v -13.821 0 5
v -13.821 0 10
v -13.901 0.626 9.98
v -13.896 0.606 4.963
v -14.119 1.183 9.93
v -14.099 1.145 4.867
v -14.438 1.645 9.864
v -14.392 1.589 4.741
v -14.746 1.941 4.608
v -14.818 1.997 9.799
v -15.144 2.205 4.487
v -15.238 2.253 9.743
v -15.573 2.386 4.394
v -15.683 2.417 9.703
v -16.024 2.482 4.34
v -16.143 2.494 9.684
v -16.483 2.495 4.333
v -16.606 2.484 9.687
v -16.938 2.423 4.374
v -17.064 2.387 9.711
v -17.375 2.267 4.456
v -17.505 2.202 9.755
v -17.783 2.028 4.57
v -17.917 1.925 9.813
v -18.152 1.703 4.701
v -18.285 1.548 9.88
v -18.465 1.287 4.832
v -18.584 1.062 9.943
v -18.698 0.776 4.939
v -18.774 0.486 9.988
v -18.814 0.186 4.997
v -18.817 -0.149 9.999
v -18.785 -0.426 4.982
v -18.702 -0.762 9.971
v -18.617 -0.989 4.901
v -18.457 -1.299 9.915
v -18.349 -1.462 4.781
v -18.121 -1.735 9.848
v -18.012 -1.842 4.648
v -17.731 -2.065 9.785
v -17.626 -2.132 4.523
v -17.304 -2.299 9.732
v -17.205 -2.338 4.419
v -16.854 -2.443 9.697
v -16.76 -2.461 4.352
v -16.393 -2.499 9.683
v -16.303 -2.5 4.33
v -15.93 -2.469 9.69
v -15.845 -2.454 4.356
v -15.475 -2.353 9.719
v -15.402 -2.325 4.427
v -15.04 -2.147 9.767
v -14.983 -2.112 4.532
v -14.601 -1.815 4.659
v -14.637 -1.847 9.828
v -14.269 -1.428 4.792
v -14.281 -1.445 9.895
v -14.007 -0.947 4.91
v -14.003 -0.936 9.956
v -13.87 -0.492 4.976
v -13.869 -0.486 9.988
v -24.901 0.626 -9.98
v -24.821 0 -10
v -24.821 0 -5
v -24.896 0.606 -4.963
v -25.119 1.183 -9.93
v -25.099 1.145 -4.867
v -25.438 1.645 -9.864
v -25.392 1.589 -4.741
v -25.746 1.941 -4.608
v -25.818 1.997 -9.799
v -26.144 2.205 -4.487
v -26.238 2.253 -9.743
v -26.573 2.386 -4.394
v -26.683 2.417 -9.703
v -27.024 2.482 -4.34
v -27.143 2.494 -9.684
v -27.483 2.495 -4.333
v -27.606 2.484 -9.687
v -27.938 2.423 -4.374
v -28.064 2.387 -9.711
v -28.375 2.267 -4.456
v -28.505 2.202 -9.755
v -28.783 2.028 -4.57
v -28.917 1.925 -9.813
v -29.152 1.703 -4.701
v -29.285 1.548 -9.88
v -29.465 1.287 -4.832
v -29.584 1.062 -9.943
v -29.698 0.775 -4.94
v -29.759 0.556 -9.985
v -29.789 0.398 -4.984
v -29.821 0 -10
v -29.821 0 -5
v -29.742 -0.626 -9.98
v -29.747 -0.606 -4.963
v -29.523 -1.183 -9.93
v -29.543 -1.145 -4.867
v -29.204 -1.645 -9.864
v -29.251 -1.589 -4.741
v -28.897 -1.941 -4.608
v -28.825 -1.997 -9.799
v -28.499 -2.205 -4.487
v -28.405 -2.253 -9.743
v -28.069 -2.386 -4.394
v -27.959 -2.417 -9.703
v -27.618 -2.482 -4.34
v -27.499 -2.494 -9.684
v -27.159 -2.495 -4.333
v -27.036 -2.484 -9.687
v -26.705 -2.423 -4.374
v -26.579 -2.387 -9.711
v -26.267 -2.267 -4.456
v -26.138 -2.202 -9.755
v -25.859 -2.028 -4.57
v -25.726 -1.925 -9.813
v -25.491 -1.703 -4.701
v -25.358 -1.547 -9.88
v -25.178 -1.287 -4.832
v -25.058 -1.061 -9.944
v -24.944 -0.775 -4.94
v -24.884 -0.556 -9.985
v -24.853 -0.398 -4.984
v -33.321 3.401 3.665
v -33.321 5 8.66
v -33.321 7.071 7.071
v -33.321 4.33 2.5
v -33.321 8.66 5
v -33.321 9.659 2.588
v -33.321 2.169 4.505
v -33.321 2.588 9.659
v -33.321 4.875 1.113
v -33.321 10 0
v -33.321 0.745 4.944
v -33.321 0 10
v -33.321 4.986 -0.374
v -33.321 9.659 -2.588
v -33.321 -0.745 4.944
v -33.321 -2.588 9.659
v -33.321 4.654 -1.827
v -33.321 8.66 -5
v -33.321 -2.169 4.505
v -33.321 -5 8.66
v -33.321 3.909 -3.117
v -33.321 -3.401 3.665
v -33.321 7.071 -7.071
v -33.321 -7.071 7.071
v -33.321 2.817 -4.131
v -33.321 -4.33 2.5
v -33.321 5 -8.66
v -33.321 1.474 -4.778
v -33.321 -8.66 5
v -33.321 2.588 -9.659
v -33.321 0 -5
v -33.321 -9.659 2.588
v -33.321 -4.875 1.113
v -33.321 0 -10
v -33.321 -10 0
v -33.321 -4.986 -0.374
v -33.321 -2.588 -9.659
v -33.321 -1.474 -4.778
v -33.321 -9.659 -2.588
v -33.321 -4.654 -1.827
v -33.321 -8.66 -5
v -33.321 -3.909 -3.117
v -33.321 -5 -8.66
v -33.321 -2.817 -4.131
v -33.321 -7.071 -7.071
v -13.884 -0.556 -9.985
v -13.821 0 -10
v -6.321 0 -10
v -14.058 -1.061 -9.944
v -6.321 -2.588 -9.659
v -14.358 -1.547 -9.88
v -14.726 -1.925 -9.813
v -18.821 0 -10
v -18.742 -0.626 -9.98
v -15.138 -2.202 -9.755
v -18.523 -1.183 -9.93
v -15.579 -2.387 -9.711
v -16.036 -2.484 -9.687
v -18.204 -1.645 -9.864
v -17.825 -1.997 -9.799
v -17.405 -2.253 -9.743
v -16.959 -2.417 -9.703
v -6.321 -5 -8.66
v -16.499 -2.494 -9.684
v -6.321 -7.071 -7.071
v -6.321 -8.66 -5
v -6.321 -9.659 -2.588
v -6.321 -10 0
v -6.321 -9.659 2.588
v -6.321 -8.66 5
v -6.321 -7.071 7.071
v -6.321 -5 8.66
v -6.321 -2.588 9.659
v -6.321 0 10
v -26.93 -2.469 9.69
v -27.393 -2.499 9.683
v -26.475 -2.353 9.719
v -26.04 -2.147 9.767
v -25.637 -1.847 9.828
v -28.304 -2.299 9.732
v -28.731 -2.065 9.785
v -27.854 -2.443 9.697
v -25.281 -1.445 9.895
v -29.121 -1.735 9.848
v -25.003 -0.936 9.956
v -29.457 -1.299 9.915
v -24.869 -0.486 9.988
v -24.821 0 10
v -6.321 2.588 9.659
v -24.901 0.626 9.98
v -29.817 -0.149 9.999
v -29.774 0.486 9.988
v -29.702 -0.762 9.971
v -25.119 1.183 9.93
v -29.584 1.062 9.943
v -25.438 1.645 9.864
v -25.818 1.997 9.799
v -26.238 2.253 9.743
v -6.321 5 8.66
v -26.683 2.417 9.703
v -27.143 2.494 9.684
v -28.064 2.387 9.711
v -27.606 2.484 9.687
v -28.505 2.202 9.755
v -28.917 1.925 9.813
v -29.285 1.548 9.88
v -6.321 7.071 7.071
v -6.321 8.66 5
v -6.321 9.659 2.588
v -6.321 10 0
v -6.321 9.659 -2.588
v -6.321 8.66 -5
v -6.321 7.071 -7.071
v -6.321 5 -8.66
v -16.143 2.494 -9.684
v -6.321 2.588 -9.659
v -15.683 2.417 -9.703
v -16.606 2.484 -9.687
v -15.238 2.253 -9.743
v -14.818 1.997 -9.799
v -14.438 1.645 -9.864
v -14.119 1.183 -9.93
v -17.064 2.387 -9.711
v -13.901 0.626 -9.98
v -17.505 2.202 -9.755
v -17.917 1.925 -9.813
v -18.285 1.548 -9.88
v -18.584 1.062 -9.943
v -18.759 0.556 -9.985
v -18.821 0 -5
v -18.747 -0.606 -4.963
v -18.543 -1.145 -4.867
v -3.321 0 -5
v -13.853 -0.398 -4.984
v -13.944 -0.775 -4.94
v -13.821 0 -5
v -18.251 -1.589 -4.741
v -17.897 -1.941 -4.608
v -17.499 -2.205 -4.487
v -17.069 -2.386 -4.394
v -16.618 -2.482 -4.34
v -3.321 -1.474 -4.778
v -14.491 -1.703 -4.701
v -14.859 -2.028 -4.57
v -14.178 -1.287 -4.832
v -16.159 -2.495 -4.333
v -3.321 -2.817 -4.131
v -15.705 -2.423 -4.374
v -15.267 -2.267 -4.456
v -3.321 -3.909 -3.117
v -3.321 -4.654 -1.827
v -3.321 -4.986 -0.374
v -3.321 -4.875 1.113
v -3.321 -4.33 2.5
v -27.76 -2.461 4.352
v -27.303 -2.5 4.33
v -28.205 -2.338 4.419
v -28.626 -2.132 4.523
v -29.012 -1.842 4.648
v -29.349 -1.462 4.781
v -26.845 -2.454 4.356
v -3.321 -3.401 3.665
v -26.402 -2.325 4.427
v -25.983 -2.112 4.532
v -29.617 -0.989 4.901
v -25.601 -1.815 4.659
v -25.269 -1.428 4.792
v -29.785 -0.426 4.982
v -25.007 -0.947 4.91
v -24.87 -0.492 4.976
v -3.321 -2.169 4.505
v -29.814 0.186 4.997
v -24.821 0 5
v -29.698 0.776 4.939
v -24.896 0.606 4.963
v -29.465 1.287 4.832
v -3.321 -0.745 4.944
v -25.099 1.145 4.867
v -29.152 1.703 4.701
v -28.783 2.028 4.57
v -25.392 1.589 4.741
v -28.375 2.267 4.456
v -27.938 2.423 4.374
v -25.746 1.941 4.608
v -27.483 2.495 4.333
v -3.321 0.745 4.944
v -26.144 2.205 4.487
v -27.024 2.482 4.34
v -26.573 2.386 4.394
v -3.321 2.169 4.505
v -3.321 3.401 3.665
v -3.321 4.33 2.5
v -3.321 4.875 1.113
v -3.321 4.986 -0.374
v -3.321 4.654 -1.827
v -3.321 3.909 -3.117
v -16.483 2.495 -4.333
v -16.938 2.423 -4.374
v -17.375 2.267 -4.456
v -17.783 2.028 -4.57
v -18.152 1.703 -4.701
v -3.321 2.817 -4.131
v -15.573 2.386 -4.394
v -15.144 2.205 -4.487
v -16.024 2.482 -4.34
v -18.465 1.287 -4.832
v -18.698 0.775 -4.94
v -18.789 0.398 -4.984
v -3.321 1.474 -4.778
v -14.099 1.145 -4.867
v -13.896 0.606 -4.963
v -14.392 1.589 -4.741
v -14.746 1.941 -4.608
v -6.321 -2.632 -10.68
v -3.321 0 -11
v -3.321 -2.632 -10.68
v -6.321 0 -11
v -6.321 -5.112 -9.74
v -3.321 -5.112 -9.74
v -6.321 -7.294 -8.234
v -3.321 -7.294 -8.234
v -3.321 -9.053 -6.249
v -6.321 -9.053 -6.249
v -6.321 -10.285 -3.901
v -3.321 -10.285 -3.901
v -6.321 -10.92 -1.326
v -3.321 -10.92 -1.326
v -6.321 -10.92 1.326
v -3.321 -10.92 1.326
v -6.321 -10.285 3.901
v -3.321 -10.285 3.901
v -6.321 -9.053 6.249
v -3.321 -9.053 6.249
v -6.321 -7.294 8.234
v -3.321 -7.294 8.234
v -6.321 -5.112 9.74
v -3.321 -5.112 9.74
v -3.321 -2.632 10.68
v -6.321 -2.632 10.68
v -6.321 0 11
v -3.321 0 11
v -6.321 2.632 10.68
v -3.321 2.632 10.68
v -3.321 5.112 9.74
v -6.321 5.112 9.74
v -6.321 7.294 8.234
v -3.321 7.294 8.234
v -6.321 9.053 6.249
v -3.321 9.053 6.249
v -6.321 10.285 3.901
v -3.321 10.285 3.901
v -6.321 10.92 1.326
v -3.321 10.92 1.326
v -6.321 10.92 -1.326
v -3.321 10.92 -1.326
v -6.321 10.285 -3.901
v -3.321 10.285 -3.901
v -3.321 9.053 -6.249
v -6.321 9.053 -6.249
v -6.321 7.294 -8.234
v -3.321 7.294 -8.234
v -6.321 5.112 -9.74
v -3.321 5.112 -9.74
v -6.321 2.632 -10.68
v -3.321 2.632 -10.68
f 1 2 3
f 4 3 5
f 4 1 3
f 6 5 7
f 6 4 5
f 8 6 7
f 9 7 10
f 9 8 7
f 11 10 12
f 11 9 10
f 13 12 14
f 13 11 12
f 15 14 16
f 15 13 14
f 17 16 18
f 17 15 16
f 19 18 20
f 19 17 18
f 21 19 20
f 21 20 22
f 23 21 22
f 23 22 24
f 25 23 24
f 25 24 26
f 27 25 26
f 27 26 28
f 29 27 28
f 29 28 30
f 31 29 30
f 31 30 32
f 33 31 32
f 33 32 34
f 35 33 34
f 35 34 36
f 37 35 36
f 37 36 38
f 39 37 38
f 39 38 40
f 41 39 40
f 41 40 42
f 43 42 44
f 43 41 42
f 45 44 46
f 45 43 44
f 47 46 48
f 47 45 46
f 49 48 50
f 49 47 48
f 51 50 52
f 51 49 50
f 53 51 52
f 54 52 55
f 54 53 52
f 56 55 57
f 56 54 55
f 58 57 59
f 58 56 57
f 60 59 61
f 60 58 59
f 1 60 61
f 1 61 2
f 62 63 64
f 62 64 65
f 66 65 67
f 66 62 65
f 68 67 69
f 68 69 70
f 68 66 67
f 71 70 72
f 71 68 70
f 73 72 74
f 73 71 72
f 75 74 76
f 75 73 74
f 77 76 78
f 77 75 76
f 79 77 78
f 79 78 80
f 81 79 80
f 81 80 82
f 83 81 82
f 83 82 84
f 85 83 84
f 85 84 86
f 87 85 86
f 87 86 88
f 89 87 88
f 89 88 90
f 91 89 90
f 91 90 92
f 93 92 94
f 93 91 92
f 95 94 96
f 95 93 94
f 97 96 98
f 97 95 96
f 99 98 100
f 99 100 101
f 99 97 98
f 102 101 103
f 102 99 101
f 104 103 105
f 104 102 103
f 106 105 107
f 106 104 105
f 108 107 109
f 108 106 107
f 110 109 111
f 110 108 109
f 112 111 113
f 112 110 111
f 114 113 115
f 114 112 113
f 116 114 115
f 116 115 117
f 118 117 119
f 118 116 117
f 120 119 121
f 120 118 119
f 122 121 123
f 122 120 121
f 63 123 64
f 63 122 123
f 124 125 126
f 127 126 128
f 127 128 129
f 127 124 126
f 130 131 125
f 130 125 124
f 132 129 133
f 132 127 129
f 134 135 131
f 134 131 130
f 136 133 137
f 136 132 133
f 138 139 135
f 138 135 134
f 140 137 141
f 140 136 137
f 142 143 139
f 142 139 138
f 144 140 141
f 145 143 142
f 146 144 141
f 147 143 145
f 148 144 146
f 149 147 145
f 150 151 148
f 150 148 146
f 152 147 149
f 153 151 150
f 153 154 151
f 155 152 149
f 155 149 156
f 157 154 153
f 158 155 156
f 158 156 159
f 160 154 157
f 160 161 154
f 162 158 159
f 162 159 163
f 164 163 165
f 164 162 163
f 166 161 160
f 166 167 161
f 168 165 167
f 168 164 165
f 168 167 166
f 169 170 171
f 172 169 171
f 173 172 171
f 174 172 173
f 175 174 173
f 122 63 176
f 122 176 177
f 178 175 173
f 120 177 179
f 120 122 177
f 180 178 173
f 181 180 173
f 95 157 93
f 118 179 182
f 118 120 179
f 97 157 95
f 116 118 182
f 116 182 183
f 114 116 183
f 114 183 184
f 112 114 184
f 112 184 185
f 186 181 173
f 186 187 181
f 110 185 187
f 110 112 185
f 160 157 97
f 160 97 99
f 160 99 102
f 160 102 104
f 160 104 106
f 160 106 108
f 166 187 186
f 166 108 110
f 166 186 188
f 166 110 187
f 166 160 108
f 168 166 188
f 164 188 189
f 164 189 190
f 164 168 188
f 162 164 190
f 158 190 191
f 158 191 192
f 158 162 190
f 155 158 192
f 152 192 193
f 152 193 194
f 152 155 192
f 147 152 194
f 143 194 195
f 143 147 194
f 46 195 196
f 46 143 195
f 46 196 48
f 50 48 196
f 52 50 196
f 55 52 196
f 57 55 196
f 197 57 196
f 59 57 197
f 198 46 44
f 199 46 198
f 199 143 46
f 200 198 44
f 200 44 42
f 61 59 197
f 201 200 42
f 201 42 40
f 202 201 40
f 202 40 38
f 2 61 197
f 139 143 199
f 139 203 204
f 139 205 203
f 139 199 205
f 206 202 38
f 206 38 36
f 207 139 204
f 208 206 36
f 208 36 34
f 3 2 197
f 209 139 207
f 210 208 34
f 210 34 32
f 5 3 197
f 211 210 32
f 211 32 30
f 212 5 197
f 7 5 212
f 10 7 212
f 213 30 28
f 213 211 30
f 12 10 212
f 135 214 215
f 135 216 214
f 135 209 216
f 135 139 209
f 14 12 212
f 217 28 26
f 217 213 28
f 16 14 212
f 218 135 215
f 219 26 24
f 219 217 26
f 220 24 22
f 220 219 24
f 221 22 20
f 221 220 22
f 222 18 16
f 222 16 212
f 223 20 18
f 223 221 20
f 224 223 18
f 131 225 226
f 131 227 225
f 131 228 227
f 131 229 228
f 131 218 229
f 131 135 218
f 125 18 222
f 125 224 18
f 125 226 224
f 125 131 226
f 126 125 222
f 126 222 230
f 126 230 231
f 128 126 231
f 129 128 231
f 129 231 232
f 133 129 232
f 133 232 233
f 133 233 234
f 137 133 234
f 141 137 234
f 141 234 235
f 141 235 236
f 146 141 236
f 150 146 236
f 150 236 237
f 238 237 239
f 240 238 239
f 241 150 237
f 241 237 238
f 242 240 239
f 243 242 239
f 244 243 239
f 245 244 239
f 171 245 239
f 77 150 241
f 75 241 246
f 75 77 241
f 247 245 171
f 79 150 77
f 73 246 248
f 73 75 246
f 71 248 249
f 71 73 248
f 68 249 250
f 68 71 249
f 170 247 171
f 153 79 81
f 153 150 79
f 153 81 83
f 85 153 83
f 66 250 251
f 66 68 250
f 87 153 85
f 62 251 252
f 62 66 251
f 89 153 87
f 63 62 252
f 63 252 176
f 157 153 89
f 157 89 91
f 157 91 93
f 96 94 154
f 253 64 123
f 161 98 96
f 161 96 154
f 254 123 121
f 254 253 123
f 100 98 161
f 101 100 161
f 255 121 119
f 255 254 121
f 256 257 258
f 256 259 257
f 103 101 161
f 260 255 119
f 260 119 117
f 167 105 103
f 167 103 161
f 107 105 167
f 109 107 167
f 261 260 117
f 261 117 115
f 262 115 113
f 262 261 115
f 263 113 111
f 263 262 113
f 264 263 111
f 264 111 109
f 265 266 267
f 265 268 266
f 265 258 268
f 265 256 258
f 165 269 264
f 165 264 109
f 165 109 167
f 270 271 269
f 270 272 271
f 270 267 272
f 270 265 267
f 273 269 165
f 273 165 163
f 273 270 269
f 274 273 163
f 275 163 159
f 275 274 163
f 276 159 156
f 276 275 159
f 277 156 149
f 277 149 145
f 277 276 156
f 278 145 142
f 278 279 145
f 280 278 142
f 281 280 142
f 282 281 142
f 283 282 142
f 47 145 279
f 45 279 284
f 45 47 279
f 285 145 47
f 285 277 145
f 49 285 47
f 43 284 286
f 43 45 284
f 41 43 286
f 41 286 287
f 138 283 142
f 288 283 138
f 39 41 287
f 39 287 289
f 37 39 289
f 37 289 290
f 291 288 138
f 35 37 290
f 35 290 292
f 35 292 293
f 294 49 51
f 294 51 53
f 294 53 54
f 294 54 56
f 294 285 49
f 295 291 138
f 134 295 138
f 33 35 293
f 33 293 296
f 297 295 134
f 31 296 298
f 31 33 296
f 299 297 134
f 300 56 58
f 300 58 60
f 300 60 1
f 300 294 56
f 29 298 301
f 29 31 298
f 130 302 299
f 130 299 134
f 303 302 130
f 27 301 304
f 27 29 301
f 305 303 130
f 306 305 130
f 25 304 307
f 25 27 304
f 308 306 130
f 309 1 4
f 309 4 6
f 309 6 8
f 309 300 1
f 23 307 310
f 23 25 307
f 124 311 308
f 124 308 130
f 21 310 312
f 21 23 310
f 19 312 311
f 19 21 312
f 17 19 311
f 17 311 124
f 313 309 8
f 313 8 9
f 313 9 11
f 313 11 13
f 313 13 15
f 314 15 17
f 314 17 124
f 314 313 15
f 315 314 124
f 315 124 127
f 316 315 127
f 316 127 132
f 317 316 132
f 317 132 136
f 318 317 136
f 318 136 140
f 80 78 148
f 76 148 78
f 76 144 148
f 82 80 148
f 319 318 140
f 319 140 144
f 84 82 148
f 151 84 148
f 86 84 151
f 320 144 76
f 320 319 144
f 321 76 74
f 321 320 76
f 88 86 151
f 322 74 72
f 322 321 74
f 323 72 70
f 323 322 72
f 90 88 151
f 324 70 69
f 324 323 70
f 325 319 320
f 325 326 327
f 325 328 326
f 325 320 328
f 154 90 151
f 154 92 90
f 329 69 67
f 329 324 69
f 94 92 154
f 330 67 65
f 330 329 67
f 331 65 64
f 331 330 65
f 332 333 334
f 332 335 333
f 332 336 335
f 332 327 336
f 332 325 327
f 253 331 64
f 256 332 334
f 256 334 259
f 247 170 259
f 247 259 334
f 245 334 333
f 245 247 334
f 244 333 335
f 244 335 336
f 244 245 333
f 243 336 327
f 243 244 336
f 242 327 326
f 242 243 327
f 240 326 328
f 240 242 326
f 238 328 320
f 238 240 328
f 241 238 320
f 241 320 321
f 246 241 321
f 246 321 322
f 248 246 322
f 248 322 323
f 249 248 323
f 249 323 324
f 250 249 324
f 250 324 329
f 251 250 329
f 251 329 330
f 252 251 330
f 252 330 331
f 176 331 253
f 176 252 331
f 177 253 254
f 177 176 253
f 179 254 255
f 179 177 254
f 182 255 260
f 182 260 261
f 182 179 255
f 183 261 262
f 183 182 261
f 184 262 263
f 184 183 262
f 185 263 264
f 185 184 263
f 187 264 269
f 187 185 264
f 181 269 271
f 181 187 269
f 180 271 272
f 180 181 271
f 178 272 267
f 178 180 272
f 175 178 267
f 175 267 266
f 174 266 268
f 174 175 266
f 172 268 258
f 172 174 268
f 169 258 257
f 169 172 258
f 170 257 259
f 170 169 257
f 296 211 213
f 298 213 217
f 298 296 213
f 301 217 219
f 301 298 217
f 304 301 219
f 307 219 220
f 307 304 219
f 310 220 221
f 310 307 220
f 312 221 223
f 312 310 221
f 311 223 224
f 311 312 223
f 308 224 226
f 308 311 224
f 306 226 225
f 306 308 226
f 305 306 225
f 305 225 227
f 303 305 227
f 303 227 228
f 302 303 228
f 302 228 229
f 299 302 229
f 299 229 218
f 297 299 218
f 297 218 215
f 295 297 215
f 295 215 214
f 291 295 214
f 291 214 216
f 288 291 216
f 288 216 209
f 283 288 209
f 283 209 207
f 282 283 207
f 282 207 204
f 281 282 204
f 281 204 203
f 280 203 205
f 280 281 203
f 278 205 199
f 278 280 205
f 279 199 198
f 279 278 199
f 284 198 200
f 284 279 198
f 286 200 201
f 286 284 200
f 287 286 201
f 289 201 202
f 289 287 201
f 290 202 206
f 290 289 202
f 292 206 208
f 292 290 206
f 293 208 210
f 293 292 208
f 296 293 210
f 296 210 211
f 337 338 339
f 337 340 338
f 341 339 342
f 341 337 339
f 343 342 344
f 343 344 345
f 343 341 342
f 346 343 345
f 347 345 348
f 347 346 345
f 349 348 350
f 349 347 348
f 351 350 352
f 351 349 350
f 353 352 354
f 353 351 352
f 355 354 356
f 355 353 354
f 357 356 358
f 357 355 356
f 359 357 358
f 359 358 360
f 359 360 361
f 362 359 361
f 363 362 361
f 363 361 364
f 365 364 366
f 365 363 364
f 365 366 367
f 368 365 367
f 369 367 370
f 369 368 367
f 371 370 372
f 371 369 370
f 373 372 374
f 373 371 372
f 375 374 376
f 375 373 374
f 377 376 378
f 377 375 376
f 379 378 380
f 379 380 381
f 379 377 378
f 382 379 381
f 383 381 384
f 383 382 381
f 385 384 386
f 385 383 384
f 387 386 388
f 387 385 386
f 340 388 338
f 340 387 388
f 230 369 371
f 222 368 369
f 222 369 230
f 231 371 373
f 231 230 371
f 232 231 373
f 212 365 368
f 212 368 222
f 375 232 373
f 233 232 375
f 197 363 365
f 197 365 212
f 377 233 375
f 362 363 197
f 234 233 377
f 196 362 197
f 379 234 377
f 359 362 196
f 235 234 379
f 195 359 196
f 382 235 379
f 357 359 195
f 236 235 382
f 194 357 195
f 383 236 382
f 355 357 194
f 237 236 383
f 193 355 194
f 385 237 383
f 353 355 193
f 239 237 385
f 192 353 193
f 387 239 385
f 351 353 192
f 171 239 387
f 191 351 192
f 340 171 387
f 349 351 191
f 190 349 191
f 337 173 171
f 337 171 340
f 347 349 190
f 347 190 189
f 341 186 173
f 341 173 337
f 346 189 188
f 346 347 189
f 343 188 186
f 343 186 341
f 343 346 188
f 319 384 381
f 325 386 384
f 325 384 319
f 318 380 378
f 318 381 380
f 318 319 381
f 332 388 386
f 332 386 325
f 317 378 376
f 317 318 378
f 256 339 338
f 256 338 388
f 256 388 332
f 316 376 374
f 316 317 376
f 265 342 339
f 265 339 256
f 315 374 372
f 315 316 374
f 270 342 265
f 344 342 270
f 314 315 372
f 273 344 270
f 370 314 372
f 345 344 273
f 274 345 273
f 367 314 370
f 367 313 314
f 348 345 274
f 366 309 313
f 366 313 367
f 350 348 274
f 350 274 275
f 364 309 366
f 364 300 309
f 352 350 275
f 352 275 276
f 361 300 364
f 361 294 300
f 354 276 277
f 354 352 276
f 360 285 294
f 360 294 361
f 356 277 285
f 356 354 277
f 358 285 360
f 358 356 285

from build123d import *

# Parameters (mm, degrees)
CUT_EXTRUDE1_DEPTH      = 37.773634973
CUT_EXTRUDE1_DEPTH_BACK = 37.773634973
SKETCH2_R               = 2.5


with BuildPart() as part:
    # Sketch1 → Revolve1 (revolve)
    with BuildSketch(Plane.XY, mode=Mode.PRIVATE) as revolve1_sk:
        Polygon((-3.321167883, 11), (-6.321167883, 11), (-6.321167883, 10), (-33.321167883, 10), (-33.321167883, 5), (-3.321167883, 5), align=None)
    revolve(revolve1_sk.sketch.rotate(Axis((0, 0, 0), (-1, 0, 0)), 90), axis=Axis((0, 0, 0), (-1, 0, 0)))

    # Sketch2 → Cut-Extrude1 (cut, two sides: drawn at the far end of the back side and taken through both)
    with BuildSketch(Plane.XY.offset(-CUT_EXTRUDE1_DEPTH_BACK)):
        with Locations((-27.321167883, 0)):
            Circle(SKETCH2_R)
        with Locations((-16.321167883, 0)):
            Circle(SKETCH2_R)
    extrude(amount=CUT_EXTRUDE1_DEPTH + CUT_EXTRUDE1_DEPTH_BACK, mode=Mode.SUBTRACT)


solid = part.part
